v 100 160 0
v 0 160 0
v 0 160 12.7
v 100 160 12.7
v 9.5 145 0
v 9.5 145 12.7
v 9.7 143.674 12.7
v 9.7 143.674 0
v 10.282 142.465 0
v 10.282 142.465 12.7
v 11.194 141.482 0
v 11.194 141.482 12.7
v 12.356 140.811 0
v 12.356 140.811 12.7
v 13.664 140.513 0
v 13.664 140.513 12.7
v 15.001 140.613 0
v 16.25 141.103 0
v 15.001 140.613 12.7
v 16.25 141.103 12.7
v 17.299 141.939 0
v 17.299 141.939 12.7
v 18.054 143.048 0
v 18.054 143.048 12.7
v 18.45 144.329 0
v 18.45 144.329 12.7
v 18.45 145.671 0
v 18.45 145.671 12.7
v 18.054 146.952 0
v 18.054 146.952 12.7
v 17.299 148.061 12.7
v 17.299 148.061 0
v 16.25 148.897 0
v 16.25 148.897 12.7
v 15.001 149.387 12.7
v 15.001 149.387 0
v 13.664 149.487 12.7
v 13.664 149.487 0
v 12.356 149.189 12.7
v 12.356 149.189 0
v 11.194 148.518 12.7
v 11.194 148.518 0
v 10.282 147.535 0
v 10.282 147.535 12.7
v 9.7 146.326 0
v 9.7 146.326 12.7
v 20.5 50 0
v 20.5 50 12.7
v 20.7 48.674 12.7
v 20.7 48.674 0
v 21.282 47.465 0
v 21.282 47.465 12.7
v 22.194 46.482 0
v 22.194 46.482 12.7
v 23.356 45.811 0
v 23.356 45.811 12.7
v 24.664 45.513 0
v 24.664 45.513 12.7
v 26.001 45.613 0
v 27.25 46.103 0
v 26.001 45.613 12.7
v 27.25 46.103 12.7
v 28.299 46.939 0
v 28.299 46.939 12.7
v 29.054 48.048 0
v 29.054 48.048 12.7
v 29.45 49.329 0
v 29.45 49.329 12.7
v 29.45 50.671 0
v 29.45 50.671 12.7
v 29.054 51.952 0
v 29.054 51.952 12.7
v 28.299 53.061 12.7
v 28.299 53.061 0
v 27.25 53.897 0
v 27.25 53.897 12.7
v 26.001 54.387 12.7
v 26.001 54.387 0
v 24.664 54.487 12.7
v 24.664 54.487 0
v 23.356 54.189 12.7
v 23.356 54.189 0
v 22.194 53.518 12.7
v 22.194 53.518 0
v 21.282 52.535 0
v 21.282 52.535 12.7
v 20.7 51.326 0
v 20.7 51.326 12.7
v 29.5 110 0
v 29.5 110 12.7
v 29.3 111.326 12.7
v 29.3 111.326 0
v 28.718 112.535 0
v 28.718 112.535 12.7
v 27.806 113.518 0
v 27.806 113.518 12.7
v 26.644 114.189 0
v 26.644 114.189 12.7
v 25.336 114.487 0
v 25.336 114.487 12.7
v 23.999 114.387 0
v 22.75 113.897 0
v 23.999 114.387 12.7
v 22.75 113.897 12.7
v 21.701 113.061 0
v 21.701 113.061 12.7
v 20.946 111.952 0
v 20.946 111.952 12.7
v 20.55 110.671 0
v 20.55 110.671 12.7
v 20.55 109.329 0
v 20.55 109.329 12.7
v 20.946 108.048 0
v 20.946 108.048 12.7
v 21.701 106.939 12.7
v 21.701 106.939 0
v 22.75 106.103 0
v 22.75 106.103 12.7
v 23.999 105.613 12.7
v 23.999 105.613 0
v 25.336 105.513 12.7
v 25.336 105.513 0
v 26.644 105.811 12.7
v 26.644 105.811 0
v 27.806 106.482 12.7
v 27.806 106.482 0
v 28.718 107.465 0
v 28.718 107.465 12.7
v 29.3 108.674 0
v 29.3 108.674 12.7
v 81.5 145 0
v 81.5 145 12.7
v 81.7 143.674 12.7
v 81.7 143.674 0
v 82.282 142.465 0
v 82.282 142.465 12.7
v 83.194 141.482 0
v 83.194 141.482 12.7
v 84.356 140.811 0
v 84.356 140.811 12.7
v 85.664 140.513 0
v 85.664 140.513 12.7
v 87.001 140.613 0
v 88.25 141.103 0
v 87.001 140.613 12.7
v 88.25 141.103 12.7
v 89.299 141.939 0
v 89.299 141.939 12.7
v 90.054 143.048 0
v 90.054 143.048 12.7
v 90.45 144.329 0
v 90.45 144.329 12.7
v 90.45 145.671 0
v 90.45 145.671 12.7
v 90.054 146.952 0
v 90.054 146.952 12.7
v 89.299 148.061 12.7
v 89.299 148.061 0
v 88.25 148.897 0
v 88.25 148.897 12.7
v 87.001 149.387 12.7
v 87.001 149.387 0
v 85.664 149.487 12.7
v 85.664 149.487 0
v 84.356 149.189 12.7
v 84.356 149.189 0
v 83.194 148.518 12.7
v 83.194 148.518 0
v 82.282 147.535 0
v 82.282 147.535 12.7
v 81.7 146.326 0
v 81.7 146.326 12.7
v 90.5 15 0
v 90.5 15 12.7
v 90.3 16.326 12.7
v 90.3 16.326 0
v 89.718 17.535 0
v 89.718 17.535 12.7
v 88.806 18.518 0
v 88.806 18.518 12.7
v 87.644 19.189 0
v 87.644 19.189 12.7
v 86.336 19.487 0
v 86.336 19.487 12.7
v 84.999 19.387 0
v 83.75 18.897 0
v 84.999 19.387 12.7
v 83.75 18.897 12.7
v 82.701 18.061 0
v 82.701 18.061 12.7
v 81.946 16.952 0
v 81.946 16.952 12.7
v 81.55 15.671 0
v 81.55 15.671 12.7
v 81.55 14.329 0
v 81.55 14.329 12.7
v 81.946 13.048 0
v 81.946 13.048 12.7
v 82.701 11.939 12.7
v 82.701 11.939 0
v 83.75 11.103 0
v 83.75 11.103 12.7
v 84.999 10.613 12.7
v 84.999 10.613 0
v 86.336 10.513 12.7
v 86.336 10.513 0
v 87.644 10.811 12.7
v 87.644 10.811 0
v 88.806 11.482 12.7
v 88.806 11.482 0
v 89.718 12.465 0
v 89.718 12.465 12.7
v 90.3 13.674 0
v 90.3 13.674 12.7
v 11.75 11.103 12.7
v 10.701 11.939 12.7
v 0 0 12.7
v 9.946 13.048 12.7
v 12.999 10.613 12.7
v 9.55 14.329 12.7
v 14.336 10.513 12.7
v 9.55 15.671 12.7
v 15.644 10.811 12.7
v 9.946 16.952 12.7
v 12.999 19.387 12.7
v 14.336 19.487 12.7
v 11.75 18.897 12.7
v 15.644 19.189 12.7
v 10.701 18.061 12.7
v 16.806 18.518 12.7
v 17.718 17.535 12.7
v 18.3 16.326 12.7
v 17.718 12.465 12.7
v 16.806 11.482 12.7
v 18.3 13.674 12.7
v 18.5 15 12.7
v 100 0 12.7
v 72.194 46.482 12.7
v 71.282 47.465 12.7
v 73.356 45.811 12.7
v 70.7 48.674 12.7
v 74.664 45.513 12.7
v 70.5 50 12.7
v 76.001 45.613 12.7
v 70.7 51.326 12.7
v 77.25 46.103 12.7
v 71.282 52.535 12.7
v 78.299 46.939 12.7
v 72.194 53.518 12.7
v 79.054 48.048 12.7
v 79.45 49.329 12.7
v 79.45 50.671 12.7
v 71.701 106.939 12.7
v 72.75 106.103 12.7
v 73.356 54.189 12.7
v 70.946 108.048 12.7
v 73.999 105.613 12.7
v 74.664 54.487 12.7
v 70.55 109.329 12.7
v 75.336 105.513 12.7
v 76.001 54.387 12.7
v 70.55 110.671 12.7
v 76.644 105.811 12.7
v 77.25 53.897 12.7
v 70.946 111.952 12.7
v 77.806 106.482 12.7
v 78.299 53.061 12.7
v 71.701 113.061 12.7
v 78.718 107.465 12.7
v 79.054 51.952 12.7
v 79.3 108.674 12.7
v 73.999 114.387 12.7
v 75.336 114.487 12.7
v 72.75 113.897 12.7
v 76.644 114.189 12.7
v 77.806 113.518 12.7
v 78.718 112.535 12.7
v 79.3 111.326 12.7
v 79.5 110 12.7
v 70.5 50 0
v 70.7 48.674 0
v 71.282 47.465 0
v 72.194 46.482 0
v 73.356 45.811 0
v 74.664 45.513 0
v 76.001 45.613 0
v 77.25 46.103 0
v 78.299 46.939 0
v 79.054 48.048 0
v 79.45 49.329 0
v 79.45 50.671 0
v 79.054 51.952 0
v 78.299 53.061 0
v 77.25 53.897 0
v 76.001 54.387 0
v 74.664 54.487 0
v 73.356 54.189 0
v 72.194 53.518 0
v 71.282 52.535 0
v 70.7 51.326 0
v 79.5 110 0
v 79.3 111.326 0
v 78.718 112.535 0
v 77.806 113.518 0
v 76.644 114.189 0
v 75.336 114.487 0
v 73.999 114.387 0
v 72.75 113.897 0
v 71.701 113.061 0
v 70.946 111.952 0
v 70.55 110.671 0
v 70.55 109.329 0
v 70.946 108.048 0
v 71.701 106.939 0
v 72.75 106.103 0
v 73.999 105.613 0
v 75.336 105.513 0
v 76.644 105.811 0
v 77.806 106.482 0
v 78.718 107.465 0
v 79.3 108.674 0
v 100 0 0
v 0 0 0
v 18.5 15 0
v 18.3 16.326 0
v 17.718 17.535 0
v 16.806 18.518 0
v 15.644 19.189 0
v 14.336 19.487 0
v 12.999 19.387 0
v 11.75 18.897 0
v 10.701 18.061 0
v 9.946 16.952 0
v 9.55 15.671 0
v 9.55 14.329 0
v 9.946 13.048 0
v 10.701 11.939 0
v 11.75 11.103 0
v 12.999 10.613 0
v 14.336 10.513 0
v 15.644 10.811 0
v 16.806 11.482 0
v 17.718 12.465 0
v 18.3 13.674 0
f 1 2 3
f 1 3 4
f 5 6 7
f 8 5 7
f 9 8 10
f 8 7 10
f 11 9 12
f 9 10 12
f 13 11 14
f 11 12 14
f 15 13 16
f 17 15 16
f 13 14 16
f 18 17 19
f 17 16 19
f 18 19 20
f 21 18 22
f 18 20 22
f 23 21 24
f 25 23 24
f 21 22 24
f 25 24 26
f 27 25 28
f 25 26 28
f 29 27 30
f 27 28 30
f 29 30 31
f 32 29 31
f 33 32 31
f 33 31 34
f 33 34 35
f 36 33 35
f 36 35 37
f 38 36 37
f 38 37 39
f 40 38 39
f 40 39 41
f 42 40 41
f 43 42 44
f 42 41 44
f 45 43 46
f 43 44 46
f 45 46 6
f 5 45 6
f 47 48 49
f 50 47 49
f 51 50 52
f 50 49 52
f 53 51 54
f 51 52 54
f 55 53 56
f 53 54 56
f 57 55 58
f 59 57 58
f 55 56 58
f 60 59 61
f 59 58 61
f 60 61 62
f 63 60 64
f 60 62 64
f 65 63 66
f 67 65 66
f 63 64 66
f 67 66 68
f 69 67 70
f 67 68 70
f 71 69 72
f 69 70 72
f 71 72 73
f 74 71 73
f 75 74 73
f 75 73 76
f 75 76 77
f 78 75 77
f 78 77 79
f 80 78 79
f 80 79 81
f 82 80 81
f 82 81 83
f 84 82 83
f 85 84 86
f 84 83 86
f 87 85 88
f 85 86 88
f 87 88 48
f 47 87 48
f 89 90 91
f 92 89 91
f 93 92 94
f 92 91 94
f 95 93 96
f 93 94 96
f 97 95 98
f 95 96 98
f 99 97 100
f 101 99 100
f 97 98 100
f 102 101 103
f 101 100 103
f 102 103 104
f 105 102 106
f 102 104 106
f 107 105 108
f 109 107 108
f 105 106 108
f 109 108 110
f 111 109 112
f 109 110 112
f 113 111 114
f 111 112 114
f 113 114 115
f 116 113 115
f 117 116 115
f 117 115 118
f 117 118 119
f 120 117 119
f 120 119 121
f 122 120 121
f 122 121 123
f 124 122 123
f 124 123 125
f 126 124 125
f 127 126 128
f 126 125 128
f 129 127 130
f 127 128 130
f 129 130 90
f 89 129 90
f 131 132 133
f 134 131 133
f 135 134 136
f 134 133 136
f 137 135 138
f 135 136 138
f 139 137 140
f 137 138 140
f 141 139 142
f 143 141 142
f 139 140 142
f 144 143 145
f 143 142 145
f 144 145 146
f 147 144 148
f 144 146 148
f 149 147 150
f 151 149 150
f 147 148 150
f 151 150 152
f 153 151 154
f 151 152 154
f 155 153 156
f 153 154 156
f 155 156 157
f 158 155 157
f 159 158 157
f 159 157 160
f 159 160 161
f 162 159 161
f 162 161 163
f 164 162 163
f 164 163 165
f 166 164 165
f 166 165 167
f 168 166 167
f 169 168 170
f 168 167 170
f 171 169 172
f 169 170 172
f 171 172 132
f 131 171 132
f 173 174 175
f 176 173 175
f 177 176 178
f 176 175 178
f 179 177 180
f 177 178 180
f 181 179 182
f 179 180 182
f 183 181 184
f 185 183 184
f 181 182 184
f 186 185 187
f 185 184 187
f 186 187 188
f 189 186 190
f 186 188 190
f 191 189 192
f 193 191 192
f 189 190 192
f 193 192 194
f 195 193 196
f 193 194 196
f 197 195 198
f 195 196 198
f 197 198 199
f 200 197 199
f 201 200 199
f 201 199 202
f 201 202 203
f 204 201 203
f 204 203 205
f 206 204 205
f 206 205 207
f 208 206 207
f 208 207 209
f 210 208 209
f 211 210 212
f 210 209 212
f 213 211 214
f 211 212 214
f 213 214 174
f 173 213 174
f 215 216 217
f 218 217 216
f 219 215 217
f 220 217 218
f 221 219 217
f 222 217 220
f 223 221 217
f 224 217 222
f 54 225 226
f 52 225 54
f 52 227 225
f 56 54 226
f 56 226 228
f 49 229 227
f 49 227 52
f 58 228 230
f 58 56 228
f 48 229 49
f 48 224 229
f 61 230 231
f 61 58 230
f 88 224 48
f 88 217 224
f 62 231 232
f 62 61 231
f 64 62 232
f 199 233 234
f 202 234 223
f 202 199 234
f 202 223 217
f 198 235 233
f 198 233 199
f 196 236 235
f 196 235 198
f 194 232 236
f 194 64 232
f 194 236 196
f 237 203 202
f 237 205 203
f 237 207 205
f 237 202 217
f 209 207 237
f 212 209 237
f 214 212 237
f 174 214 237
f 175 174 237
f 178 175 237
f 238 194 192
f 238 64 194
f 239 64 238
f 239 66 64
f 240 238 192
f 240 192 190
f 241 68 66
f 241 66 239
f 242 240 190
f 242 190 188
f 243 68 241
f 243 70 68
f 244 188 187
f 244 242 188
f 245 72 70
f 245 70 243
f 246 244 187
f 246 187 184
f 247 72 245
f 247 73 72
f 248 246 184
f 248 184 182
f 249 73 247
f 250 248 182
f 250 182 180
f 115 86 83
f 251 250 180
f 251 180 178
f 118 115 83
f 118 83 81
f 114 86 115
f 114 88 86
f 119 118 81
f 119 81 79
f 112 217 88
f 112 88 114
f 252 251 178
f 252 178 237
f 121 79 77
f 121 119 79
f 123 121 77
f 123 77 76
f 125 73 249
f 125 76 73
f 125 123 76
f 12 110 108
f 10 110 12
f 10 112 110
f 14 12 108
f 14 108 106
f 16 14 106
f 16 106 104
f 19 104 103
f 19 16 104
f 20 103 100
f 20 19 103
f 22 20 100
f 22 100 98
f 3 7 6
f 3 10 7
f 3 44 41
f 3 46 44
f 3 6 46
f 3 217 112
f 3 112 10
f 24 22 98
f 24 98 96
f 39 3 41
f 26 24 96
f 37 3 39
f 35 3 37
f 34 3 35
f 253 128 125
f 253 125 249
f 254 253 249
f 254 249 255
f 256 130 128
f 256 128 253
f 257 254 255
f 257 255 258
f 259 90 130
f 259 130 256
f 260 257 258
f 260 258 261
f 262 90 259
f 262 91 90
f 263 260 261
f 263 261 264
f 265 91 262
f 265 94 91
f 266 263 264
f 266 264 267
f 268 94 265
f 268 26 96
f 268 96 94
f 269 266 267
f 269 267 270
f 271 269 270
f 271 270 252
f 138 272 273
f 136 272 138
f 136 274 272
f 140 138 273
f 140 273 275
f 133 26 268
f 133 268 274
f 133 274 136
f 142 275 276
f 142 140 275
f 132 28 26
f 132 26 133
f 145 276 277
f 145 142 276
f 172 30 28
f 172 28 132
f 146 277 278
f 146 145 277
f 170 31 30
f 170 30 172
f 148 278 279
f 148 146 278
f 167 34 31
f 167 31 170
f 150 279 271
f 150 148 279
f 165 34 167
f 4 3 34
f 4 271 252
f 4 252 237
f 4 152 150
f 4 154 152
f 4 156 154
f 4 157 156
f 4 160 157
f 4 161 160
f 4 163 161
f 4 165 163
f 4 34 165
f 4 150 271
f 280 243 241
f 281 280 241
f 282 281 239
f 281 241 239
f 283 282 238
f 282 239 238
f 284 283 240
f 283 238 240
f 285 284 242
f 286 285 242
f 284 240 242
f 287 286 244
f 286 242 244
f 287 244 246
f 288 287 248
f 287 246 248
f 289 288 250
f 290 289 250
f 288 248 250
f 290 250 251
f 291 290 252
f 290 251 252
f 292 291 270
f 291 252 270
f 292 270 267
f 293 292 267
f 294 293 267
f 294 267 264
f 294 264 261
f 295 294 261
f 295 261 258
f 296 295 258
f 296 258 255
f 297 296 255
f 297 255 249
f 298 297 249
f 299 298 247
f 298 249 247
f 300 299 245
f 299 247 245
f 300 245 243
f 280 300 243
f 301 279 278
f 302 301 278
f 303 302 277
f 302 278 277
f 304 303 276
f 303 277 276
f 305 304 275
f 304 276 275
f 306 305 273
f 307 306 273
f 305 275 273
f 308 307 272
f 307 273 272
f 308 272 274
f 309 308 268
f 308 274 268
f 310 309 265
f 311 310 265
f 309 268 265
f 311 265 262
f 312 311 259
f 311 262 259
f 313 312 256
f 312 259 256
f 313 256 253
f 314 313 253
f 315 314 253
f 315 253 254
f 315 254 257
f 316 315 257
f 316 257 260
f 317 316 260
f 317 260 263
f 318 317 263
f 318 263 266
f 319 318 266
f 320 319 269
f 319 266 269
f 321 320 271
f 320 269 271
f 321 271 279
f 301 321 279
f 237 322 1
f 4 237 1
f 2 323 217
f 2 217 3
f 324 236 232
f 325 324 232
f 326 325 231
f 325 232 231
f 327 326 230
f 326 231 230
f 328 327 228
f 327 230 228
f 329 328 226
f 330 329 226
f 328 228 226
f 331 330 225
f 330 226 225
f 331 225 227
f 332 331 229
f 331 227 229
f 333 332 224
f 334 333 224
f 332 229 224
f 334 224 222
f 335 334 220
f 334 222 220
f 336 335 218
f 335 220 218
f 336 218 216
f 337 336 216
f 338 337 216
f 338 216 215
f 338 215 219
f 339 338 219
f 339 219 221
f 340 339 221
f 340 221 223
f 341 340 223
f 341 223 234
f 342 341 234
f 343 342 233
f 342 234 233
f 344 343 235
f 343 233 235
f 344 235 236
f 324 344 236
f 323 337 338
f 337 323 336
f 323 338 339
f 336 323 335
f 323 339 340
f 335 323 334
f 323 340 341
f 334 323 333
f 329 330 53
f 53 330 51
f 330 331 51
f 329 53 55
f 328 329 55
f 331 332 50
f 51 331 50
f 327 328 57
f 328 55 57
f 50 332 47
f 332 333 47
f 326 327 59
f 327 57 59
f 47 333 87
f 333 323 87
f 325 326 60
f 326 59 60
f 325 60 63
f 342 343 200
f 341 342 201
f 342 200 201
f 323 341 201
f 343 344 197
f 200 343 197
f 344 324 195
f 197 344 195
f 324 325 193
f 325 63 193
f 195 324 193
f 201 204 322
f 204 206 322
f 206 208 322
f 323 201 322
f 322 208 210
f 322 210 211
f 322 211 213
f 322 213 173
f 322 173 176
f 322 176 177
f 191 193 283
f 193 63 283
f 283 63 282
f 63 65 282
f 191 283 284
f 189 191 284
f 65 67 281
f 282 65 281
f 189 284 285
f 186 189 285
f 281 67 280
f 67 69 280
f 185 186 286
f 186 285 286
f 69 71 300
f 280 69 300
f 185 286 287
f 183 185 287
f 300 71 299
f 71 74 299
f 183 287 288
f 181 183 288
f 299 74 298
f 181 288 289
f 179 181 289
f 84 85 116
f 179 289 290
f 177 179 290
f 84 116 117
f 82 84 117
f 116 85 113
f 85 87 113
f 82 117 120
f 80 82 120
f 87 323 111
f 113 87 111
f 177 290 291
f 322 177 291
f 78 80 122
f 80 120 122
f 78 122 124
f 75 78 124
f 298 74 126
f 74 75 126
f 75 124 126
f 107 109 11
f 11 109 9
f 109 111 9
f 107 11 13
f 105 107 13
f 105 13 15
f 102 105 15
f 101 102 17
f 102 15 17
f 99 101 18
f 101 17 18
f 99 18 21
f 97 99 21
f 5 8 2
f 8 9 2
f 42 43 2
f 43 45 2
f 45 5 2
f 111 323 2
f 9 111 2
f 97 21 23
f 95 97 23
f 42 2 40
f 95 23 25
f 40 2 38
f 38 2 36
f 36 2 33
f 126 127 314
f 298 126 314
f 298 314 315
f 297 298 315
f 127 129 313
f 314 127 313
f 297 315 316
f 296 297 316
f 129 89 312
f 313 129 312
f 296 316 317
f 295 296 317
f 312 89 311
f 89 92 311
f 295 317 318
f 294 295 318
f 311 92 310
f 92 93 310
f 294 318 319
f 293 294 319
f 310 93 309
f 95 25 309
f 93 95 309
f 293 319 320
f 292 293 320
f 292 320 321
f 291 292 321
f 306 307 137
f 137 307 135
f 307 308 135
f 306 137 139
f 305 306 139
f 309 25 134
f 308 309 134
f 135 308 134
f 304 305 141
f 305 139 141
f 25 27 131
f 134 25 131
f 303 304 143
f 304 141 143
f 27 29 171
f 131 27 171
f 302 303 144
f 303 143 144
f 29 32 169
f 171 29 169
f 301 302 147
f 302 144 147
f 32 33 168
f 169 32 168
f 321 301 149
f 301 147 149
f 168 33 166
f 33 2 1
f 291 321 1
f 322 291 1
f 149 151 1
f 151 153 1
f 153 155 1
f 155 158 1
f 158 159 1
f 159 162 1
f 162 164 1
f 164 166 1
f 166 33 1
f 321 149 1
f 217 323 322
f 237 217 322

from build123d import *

# Parameters (mm, degrees)
SKETCH1_W           = 100
SKETCH1_H           = 160
BOSS_EXTRUDE1_DEPTH = 12.7
SKETCH2_R           = 4.5
CUT_EXTRUDE1_DEPTH  = 12.7
SKETCH3_R           = 4.5
CUT_EXTRUDE2_DEPTH  = 12.7


with BuildPart() as part:
    # Sketch1 → Boss-Extrude1 (new body)
    with BuildSketch(Plane.XY):
        with Locations((50, 80)):
            Rectangle(SKETCH1_W, SKETCH1_H)
    extrude(amount=BOSS_EXTRUDE1_DEPTH)

    # Sketch2 → Cut-Extrude1 (cut)
    with BuildSketch(Plane(origin=(0, 0, 12.7), x_dir=(-1, 0, 0), z_dir=(0, 0, 1))):
        with Locations(Location((-75, -110, 0), (0, 0, 180))):
            Circle(SKETCH2_R)
        with Locations(Location((-25, -110, 0), (0, 0, 180))):
            Circle(SKETCH2_R)
        with Locations((-25, -50)):
            Circle(SKETCH2_R)
        with Locations((-75, -50)):
            Circle(SKETCH2_R)
    extrude(amount=-CUT_EXTRUDE1_DEPTH, mode=Mode.SUBTRACT)

    # Sketch3 → Cut-Extrude2 (cut)
    with BuildSketch(Plane.XY.offset(12.7)):
        with Locations((14, 15)):
            Circle(SKETCH3_R)
        with Locations((86, 15)):
            Circle(SKETCH3_R)
        with Locations(Location((14, 145, 0), (0, 0, 180))):
            Circle(SKETCH3_R)
        with Locations(Location((86, 145, 0), (0, 0, 180))):
            Circle(SKETCH3_R)
    extrude(amount=-CUT_EXTRUDE2_DEPTH, mode=Mode.SUBTRACT)


solid = part.part
